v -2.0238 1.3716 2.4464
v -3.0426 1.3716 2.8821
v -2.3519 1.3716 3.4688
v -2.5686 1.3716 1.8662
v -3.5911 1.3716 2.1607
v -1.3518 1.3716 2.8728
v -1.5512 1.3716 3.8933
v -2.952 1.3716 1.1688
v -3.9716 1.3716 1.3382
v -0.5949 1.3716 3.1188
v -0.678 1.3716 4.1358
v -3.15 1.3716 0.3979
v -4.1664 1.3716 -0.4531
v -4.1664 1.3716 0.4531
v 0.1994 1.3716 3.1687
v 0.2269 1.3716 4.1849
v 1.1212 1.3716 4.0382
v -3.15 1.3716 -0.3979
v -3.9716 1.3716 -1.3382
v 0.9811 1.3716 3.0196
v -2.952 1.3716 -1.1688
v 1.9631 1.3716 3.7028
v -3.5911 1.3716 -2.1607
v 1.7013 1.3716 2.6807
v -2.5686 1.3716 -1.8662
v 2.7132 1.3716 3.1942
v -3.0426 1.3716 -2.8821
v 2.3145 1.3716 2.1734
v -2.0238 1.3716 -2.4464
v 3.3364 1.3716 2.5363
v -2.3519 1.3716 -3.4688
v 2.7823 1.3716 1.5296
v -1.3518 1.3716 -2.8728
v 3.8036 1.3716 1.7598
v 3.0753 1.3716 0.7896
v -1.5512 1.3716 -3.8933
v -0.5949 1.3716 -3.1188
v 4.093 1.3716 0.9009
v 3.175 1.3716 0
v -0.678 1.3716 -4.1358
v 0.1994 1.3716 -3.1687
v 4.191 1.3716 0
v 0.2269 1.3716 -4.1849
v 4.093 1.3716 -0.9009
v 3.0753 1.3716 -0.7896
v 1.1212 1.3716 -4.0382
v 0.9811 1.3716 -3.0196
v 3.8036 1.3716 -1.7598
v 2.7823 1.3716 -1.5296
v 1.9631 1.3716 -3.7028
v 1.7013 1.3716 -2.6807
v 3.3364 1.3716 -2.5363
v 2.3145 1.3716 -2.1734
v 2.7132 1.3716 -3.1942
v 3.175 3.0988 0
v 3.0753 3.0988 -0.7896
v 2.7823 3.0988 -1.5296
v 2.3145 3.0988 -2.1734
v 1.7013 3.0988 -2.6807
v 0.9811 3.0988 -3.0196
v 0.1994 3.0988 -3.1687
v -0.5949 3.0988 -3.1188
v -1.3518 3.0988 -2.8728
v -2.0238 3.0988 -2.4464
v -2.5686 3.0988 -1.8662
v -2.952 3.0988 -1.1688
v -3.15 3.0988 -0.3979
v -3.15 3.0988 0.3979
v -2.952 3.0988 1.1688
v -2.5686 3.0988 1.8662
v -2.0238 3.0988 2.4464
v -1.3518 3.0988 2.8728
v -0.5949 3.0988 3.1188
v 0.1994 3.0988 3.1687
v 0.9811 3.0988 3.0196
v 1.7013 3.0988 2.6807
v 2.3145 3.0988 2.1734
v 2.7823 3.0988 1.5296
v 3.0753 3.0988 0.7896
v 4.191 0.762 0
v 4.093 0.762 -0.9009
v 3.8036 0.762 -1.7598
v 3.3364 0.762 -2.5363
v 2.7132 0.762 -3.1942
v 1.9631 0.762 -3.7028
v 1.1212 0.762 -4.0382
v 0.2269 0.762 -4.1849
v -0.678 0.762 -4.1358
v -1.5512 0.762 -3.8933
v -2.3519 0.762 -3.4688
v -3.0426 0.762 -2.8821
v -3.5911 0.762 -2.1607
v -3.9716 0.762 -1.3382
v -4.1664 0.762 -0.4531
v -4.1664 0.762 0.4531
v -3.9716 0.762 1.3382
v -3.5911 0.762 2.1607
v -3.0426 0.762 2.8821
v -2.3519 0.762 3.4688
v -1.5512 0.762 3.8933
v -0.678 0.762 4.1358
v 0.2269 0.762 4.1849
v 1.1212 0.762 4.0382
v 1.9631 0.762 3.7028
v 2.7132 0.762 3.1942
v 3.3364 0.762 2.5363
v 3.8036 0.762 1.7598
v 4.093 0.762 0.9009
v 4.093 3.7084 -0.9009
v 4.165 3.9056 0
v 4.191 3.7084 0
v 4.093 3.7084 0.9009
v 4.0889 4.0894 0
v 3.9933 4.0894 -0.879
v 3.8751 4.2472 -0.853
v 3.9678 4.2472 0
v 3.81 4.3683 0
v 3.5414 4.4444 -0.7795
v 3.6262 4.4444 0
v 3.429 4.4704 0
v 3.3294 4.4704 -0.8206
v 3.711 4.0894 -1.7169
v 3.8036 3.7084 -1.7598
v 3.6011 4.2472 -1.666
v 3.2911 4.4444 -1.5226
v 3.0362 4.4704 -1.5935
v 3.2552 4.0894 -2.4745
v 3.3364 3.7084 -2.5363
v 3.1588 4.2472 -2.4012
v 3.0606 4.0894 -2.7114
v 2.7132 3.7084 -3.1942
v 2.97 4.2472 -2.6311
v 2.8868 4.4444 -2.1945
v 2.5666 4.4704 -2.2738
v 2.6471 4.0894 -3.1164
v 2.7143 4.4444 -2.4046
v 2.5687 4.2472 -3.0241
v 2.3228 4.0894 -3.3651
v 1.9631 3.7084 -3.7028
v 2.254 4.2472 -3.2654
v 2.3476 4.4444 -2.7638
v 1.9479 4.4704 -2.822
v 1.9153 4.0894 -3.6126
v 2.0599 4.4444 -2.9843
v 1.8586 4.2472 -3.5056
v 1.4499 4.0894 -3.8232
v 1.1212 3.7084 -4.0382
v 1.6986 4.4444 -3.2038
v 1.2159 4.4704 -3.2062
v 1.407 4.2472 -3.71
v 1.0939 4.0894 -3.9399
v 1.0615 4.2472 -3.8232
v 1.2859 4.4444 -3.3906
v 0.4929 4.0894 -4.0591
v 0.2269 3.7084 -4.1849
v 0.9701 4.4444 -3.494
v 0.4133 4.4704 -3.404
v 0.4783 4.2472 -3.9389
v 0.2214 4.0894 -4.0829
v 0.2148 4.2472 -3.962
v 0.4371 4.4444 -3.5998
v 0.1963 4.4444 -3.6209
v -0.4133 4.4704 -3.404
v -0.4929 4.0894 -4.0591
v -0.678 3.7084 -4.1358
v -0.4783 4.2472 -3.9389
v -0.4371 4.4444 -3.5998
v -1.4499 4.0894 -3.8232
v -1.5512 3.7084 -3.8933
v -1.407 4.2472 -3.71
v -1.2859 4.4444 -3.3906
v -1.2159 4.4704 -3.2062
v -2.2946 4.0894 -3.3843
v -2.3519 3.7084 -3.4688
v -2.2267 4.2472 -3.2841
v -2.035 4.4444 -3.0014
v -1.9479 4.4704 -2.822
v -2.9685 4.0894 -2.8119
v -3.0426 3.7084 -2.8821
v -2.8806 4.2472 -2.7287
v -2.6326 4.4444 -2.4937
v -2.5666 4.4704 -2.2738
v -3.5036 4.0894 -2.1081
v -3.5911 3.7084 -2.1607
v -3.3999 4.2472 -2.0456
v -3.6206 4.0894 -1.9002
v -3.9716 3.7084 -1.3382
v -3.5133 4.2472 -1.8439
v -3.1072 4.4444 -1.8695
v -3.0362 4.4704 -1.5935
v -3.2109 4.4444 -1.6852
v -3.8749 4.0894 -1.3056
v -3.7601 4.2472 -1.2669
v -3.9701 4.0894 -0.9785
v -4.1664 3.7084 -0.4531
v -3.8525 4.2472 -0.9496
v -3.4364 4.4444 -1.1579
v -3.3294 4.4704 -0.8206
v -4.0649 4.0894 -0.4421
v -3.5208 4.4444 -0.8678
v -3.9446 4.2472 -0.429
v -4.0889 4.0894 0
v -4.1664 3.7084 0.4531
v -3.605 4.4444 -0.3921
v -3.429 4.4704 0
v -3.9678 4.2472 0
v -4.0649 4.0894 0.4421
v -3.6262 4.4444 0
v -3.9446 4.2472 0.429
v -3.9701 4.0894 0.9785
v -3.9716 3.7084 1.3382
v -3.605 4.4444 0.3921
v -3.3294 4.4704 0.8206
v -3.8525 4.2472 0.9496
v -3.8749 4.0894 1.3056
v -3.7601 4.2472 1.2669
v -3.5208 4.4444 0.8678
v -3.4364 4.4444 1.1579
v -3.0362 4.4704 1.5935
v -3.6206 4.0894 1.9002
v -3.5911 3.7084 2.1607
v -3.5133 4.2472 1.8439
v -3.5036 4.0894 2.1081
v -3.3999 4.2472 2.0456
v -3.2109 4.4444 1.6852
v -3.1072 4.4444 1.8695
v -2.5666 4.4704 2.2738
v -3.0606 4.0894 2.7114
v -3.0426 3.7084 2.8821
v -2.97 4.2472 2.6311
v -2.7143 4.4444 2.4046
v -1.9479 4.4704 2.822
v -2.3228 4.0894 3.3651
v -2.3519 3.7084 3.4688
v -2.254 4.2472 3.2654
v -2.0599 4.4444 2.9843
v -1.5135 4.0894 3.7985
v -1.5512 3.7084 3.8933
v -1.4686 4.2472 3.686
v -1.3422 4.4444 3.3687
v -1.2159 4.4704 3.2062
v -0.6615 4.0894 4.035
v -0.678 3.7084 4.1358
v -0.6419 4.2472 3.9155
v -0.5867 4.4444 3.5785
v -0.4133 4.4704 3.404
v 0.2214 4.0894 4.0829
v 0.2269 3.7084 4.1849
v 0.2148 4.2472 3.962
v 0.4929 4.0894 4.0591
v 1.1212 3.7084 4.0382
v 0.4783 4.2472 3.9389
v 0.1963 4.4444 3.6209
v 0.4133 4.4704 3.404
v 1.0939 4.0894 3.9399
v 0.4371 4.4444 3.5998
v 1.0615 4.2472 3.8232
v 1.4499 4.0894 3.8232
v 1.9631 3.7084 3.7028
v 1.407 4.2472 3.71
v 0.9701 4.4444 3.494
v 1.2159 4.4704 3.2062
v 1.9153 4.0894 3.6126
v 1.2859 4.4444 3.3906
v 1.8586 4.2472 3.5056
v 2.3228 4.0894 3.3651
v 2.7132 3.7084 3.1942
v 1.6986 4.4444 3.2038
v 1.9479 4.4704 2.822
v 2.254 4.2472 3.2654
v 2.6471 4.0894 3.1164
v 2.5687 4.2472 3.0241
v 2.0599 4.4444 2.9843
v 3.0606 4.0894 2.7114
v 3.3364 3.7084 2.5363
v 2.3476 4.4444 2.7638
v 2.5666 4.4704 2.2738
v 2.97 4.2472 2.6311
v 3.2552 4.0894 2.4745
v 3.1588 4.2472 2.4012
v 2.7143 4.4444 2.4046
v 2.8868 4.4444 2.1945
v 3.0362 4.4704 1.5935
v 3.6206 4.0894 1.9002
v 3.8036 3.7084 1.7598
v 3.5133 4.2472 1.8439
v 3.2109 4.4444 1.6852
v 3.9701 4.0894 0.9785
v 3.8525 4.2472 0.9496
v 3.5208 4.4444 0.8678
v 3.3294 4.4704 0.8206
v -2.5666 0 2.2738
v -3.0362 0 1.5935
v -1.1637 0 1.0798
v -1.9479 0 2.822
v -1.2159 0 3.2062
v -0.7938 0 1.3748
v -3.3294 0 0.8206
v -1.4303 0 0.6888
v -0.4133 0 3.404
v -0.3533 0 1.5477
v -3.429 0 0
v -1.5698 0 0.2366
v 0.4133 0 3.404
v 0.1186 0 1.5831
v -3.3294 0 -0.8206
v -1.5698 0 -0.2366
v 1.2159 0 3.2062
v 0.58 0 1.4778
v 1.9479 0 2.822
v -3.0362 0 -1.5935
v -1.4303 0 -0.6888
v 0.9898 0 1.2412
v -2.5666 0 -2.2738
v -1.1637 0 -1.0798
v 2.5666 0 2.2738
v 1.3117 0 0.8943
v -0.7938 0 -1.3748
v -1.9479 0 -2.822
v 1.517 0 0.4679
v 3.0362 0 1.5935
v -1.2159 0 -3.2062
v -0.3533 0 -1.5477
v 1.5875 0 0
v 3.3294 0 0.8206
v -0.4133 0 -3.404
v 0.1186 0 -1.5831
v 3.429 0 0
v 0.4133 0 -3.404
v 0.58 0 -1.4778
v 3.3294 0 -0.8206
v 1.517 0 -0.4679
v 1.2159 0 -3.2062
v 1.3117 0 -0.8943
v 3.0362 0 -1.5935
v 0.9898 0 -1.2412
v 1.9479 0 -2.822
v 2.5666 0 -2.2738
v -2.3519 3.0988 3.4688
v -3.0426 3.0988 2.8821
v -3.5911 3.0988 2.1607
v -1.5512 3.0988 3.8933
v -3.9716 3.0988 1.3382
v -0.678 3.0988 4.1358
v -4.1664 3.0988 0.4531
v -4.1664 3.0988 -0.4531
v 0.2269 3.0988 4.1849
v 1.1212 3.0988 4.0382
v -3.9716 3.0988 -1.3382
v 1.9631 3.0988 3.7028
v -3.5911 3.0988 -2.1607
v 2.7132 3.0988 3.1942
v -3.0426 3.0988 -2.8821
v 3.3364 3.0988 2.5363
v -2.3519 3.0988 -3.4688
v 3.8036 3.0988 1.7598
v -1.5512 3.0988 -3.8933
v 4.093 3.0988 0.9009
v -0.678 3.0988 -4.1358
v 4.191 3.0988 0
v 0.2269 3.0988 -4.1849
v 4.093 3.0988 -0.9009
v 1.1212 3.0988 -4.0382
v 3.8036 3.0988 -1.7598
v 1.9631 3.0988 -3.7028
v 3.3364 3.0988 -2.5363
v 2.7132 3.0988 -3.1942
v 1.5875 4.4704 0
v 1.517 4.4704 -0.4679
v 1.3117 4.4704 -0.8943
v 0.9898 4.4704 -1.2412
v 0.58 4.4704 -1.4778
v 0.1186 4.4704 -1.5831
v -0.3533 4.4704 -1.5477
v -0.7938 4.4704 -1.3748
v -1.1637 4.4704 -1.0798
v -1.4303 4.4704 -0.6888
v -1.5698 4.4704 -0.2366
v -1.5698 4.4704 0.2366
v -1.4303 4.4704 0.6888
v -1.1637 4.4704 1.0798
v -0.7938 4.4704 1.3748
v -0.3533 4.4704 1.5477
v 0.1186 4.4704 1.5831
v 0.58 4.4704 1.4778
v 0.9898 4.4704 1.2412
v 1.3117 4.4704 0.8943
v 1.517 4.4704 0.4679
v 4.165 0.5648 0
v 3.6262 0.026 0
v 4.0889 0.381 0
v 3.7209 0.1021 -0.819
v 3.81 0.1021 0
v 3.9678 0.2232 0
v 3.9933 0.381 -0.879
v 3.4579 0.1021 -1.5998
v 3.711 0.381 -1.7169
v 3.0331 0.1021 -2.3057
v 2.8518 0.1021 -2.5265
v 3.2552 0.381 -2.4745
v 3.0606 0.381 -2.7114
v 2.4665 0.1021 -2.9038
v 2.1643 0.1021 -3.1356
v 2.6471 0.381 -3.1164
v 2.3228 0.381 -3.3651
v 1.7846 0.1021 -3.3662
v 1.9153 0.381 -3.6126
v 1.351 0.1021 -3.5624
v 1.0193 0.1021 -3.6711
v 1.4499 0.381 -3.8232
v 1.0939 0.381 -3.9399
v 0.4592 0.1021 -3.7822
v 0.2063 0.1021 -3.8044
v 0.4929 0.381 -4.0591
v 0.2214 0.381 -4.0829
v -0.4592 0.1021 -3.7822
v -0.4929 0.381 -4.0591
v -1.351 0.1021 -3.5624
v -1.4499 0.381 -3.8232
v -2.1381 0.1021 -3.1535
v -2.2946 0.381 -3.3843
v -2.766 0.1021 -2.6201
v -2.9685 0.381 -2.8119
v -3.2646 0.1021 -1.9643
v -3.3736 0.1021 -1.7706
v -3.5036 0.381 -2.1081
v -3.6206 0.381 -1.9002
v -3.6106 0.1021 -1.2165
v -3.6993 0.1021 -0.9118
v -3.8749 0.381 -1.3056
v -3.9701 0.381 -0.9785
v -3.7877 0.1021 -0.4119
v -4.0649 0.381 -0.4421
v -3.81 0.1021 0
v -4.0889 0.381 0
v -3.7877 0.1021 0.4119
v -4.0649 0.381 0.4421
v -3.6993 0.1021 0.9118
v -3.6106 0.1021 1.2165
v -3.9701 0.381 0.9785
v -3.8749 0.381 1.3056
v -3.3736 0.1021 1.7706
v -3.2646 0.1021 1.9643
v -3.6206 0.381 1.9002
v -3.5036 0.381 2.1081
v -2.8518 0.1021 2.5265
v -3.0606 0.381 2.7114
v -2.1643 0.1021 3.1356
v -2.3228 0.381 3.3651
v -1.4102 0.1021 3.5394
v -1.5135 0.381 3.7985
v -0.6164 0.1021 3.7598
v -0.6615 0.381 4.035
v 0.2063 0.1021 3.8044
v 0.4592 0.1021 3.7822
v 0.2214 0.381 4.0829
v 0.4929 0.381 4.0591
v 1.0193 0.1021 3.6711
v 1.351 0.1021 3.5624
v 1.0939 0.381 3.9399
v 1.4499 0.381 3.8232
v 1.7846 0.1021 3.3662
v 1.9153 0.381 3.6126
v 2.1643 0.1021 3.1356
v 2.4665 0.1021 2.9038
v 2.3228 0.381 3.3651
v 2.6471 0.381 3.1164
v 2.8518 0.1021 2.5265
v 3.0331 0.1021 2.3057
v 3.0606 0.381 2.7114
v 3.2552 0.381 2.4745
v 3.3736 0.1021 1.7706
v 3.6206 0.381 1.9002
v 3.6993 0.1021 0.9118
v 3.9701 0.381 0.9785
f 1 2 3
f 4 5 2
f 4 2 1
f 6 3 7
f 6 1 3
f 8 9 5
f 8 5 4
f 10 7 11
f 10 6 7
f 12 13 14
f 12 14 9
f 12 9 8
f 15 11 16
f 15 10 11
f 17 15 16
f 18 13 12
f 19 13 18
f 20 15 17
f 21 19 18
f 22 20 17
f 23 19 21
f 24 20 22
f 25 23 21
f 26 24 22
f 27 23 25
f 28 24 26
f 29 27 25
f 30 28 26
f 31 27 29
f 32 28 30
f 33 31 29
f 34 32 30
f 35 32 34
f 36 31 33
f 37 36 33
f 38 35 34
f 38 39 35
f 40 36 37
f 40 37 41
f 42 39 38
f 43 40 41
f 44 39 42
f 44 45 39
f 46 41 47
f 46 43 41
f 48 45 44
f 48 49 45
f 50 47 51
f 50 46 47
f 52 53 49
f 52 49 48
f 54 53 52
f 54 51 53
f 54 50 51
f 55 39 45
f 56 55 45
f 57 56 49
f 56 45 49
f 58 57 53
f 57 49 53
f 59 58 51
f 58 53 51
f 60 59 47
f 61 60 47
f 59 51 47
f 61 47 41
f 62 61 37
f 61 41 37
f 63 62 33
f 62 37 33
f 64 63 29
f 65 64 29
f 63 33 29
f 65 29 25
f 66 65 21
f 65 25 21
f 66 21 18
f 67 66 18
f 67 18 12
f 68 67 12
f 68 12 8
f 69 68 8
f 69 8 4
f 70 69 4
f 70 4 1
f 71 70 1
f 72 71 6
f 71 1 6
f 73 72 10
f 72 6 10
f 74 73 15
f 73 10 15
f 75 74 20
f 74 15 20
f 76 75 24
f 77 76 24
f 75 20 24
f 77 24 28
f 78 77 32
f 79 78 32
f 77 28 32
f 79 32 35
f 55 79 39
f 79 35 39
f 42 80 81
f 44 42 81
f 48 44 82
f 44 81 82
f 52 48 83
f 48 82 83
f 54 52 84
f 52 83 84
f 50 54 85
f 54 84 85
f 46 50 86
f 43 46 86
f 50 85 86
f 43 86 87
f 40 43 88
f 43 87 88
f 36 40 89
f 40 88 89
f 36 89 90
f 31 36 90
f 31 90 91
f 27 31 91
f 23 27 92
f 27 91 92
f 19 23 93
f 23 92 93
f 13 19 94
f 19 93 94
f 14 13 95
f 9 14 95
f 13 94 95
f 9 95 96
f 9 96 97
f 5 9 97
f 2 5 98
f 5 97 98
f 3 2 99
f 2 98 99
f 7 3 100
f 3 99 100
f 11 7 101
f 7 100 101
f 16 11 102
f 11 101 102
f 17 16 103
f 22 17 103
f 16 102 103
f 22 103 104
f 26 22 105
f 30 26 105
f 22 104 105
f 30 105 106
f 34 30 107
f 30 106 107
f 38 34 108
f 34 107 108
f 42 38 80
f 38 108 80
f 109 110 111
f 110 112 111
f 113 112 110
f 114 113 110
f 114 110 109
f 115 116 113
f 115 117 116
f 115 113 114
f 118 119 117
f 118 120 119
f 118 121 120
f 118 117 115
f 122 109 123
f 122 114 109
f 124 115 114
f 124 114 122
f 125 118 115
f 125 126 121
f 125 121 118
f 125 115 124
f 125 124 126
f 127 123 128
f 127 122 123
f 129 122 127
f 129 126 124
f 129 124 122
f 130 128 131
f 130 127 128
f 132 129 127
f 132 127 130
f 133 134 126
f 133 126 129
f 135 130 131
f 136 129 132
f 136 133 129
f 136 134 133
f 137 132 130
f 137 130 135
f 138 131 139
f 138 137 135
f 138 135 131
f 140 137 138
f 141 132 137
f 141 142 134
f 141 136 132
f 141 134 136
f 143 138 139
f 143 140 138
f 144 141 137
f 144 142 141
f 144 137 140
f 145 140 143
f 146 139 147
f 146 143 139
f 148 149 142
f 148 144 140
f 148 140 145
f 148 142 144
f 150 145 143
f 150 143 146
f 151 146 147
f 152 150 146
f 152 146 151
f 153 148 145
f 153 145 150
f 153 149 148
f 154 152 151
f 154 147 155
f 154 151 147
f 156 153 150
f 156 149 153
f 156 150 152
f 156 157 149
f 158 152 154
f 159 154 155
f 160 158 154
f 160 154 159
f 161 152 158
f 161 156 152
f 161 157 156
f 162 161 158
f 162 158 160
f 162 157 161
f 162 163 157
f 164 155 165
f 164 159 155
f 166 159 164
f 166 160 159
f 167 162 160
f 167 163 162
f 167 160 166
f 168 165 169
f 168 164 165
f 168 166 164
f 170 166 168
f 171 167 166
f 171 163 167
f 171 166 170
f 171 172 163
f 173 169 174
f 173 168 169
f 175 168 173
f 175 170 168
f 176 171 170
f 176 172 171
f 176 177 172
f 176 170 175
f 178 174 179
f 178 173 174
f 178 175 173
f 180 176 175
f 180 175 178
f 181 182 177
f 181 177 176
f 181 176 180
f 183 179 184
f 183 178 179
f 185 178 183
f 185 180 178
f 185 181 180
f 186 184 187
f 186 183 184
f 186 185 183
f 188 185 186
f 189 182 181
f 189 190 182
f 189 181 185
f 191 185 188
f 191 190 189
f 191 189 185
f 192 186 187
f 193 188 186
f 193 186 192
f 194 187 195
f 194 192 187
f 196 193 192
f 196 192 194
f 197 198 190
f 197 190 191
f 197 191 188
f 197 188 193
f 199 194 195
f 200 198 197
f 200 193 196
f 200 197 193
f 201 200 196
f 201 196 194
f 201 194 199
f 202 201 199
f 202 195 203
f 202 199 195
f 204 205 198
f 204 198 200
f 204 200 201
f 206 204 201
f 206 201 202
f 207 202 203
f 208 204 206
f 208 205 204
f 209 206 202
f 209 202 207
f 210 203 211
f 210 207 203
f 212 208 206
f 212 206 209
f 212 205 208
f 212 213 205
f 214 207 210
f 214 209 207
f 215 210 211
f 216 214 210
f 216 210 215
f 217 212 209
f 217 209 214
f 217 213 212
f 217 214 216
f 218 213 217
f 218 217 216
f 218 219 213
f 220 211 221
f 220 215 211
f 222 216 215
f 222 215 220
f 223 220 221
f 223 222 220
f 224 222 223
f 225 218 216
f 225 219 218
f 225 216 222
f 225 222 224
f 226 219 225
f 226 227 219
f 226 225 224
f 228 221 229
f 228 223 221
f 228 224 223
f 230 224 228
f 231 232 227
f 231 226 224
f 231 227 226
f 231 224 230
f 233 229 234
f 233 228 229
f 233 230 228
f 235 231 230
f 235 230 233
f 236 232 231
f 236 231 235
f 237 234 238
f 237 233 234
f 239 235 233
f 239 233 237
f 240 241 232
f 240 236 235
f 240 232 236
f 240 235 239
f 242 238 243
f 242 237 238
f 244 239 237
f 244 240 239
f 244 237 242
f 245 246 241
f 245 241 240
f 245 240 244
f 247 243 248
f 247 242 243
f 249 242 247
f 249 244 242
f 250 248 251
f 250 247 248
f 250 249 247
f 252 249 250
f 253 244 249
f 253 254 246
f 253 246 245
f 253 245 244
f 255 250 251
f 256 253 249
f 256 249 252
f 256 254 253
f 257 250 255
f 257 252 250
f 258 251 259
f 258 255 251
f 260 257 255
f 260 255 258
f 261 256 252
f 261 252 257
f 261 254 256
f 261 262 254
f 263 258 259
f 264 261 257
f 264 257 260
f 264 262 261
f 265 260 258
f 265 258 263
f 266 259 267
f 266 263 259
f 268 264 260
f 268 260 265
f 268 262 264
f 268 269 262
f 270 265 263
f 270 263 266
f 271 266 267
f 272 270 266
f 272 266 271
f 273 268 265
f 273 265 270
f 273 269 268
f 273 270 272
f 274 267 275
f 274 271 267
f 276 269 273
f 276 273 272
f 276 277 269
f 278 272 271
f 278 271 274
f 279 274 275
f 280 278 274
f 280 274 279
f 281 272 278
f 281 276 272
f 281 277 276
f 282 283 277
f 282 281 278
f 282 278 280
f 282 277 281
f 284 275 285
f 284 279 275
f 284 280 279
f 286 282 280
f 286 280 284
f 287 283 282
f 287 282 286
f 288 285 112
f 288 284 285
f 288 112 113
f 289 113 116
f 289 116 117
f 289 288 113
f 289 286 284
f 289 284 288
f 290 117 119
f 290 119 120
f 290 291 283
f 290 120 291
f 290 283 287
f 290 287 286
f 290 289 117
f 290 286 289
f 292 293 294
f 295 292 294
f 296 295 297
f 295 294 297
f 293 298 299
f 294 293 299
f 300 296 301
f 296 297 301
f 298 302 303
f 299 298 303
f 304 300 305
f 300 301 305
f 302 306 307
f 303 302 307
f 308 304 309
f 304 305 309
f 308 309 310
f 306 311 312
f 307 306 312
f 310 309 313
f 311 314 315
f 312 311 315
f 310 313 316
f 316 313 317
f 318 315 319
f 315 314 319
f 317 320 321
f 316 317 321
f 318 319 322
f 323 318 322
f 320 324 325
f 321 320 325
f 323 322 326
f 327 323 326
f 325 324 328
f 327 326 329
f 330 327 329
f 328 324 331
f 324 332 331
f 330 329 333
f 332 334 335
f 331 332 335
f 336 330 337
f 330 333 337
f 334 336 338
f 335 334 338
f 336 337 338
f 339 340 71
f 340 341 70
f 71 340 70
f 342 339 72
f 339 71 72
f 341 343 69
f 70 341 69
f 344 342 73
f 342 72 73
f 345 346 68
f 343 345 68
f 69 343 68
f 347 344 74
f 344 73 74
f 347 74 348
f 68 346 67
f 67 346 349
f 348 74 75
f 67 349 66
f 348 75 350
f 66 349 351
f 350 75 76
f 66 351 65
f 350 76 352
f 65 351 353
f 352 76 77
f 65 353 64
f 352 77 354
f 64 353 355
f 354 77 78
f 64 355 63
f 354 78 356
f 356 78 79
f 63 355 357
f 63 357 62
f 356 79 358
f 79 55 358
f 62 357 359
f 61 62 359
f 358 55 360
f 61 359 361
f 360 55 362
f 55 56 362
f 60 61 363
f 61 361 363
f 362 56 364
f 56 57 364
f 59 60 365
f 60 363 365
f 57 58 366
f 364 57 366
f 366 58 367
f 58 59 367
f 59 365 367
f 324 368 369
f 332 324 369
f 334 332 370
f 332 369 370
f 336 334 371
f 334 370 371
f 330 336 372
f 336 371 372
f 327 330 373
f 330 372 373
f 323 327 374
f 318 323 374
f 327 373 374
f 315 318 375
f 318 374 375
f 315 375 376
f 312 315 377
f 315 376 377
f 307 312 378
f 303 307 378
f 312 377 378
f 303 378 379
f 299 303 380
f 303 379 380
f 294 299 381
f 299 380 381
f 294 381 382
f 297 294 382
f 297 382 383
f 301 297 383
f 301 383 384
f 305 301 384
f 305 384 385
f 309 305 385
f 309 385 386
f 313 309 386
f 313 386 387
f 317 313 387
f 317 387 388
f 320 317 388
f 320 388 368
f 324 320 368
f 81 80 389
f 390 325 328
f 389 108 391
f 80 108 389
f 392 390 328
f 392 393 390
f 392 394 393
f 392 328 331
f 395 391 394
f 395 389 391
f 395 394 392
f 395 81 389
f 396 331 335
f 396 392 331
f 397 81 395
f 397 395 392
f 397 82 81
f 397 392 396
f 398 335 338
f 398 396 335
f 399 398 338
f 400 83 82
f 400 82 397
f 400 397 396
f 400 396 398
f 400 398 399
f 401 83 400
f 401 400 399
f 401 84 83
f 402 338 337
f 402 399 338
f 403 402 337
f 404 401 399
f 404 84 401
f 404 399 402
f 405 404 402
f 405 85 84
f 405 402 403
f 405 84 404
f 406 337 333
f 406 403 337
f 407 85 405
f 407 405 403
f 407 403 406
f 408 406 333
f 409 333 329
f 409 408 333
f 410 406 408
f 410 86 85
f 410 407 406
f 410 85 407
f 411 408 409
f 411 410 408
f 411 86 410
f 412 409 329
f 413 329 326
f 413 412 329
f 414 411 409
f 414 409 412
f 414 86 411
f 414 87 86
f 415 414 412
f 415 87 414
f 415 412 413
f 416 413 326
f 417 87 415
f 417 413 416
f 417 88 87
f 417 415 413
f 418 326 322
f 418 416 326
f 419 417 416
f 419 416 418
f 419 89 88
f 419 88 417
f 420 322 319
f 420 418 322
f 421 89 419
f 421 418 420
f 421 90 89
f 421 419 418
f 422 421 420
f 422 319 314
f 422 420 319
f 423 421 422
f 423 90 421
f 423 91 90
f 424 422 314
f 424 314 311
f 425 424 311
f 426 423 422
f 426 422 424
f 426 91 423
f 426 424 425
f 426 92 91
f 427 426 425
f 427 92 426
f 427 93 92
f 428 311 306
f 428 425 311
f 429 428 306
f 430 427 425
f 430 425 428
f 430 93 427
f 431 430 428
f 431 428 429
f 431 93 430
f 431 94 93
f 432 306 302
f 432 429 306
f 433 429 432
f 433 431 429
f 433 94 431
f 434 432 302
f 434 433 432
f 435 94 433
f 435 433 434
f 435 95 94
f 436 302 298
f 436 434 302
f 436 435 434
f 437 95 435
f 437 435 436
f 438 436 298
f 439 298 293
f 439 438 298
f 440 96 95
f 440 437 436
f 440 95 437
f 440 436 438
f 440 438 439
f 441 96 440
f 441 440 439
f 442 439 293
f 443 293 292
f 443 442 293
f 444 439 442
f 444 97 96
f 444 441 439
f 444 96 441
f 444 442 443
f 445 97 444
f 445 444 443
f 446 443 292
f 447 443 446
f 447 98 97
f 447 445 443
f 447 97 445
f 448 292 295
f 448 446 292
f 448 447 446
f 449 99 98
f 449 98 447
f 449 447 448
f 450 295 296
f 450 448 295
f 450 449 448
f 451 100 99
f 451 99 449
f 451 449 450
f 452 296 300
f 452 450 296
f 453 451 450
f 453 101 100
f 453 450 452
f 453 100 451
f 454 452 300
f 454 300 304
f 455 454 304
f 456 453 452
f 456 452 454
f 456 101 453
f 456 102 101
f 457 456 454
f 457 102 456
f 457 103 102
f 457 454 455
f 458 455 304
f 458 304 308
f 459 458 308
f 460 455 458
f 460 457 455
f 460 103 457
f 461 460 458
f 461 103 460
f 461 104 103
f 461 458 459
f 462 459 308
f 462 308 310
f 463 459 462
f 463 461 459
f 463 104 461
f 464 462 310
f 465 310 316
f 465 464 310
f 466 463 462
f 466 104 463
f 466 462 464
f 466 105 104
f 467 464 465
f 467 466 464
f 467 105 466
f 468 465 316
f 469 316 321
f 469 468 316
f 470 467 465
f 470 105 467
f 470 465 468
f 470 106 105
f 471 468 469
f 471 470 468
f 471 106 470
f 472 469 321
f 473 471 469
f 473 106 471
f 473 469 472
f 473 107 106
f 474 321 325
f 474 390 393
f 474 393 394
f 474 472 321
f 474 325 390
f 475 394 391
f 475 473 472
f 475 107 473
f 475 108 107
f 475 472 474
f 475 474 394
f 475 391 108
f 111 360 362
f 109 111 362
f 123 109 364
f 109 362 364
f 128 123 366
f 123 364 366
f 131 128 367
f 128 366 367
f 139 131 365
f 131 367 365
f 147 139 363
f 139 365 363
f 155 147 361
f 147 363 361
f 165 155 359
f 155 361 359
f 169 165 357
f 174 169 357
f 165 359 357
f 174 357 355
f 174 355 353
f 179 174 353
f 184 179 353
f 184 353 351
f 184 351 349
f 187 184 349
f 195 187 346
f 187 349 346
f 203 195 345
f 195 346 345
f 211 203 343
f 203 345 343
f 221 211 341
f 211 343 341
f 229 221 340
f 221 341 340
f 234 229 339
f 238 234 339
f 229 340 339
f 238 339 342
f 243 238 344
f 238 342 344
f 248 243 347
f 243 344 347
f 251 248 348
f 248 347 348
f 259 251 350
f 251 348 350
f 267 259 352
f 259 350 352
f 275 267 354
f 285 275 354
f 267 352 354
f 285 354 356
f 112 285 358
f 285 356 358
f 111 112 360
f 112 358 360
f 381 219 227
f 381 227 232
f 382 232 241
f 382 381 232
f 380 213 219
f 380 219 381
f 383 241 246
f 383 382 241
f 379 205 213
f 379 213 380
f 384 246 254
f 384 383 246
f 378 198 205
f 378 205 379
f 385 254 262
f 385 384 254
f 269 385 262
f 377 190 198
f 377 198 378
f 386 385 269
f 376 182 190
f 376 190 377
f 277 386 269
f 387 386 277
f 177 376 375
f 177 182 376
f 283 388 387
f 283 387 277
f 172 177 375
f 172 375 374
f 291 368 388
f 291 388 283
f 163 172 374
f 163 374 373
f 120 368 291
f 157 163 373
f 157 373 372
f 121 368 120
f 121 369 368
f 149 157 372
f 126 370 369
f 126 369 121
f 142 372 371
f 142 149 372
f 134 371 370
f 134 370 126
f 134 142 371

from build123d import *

# Parameters (mm, degrees)
SKETCH1_R           = 4.191
BOSS_EXTRUDE1_DEPTH = 1.3716
SKETCH2_R           = 3.175
BOSS_EXTRUDE2_DEPTH = 1.7272
SKETCH3_R           = 4.191
BOSS_EXTRUDE3_DEPTH = 1.3716
SKETCH4_R           = 1.5875
CUT_EXTRUDE1_DEPTH  = 5.4704
FILLET1_R           = 0.762


with BuildPart() as part:
    # Sketch1 → Boss-Extrude1 (new body)
    with BuildSketch(Plane(origin=(0, 0, 0), x_dir=(1, 0, 0), z_dir=(0, 1, 0))):
        Circle(SKETCH1_R)
    extrude(amount=BOSS_EXTRUDE1_DEPTH)

    # Sketch2 → Boss-Extrude2 (add)
    with BuildSketch(Plane(origin=(0, 1.3716, 0), x_dir=(1, 0, 0), z_dir=(0, 1, 0))):
        Circle(SKETCH2_R)
    extrude(amount=BOSS_EXTRUDE2_DEPTH)

    # Sketch3 → Boss-Extrude3 (add)
    with BuildSketch(Plane(origin=(0, 3.0988, 0), x_dir=(1, 0, 0), z_dir=(0, 1, 0))):
        Circle(SKETCH3_R)
    extrude(amount=BOSS_EXTRUDE3_DEPTH)

    # Sketch4 → Cut-Extrude1 (cut, through all)
    with BuildSketch(Plane(origin=(0, 4.4704, 0), x_dir=(1, 0, 0), z_dir=(0, 1, 0))):
        Circle(SKETCH4_R)
    extrude(amount=-CUT_EXTRUDE1_DEPTH, mode=Mode.SUBTRACT)

    # Fillet1
    fillet1_edges = [part.edges().sort_by_distance(p)[0] for p in [
        (-4.191, 4.4704, 0),
        (-4.191, 0, 0),
    ]]
    fillet(fillet1_edges, radius=FILLET1_R)


solid = part.part
